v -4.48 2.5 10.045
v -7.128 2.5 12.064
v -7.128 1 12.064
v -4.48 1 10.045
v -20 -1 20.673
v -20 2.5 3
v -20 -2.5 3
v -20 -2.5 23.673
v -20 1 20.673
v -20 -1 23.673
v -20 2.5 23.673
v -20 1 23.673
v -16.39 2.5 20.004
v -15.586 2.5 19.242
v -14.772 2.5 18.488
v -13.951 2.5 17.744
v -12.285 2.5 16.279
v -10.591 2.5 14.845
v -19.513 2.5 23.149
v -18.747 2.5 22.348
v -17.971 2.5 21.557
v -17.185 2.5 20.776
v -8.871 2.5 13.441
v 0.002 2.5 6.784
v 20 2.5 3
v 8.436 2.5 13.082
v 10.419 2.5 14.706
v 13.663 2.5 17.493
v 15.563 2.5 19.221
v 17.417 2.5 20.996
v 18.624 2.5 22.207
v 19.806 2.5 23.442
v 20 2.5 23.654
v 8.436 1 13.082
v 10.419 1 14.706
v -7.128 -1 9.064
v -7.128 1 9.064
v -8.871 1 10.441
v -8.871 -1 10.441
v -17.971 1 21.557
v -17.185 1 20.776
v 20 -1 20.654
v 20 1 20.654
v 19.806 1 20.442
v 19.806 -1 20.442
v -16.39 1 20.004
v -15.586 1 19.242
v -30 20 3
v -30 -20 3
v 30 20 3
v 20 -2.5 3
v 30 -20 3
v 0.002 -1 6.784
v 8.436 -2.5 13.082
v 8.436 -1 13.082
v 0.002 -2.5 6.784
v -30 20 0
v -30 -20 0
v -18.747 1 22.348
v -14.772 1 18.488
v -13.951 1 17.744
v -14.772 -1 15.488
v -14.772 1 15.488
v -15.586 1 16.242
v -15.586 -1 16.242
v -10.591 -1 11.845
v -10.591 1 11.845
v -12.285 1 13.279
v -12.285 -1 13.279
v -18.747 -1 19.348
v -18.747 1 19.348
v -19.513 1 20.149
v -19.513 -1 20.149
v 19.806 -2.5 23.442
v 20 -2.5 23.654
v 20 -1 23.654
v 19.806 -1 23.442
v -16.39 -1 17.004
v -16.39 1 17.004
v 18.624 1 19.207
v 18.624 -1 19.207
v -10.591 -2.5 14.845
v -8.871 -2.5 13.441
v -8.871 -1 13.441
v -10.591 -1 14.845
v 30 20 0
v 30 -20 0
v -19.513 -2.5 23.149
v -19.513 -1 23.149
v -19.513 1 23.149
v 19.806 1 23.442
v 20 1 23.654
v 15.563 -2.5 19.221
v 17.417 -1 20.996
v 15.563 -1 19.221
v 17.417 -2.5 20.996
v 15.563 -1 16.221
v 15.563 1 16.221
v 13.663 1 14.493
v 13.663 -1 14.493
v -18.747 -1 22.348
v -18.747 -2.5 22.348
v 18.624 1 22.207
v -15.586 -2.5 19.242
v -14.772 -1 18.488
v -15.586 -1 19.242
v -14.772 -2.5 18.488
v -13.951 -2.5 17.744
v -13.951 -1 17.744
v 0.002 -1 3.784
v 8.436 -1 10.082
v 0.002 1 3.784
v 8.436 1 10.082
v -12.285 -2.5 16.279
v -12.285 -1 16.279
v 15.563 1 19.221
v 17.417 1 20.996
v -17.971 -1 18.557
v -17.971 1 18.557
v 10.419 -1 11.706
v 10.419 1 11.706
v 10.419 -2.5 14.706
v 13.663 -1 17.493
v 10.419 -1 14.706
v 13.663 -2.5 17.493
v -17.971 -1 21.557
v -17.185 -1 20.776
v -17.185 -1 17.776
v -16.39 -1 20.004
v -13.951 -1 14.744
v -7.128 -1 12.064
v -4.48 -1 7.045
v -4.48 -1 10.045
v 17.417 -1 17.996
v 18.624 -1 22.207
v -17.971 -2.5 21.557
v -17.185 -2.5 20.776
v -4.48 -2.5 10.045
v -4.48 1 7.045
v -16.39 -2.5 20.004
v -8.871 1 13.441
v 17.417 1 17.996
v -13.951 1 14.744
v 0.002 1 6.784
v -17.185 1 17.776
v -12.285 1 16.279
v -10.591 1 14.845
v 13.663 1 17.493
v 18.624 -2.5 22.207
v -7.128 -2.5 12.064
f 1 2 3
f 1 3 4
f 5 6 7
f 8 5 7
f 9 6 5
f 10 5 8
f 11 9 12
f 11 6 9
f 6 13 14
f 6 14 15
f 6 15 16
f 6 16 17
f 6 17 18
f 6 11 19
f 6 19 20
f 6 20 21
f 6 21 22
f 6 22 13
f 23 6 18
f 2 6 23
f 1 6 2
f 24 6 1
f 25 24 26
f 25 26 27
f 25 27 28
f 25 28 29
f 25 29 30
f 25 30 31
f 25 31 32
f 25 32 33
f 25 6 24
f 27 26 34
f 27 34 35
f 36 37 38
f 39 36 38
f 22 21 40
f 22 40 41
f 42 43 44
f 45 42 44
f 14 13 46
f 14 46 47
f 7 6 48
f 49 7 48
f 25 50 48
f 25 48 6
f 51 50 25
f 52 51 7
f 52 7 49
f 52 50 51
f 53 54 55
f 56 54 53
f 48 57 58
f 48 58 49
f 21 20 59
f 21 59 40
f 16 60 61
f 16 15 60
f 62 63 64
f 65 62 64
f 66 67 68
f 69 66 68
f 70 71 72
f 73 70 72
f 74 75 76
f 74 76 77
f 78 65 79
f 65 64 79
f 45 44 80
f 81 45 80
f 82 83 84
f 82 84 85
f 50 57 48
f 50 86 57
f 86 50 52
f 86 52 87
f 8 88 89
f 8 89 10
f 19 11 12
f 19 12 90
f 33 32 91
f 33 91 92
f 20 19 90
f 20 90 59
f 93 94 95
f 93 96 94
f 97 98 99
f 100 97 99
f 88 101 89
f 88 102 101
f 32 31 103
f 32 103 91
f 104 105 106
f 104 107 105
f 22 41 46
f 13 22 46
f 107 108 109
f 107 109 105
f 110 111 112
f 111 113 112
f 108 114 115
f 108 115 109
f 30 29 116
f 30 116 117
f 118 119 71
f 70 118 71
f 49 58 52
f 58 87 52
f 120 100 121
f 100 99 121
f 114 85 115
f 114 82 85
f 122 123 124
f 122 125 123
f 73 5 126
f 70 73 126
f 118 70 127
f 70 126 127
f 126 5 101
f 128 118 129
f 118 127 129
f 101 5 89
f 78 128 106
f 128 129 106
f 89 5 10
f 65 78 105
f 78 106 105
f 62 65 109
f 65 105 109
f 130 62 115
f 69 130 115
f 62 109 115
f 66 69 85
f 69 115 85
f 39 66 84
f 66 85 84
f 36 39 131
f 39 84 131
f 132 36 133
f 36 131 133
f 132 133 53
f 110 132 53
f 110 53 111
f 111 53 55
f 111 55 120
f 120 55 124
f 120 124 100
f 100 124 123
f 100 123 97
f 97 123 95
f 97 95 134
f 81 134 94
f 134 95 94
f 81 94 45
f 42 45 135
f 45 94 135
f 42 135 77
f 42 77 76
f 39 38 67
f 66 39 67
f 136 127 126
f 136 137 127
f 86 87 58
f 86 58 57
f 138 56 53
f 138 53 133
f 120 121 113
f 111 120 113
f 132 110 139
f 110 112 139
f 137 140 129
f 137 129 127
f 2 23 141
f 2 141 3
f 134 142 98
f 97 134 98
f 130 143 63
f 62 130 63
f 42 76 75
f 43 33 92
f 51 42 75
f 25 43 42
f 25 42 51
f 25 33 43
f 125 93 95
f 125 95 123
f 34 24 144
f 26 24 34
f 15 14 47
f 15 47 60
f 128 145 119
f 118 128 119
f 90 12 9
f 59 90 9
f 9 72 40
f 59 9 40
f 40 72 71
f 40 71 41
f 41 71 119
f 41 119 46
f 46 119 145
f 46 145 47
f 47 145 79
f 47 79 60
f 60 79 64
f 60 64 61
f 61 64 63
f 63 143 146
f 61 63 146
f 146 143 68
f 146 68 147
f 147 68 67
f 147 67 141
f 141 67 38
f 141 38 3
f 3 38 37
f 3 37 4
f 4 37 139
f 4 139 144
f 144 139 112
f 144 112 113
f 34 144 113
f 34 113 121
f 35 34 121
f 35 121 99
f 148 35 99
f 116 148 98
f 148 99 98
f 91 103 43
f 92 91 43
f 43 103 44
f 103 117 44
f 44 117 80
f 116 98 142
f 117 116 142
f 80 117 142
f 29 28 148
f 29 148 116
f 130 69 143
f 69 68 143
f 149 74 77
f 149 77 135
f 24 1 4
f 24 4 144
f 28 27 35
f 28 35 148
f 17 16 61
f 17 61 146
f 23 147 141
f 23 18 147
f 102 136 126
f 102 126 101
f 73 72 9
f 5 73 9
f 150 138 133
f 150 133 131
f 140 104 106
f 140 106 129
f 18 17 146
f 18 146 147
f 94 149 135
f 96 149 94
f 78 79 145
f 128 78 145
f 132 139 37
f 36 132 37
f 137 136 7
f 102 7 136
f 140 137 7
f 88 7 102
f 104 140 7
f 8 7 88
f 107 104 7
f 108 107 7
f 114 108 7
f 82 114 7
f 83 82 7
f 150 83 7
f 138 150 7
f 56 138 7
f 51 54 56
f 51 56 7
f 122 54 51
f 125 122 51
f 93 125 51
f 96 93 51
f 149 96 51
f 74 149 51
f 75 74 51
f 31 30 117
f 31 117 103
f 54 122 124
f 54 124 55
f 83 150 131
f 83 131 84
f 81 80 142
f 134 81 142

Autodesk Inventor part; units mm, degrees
ref_plane "YZ Plane" through (0, 0, 0) normal (1, 0, 0) x (0, 1, 0)
ref_plane "XZ Plane" through (0, 0, 0) normal (0, 1, 0) x (-1, 0, 0)
ref_plane "XY Plane" through (0, 0, 0) normal (0, 0, 1) x (1, 0, 0)
sketch "Sketch1" plane through (0, 0, 0) normal (0, 0, 1) x (1, 0, 0)
  line L0 (-20, -20) -> (20, -20)
  line L1 (20, -20) -> (20, 20)
  line L2 (20, 20) -> (-20, 20)
  line L3 (-20, 20) -> (-20, -20)
  line L4 (-20, -20) -> (20, 20) construction
  line L5 (20, -20) -> (-20, 20) construction
  point P0 (0, 0)
  dimension "d0" = 40
  dimension "d1" = 40
extrude "Extrusion1" add sketch "Sketch1" along normal blind 3
ref_plane "Work Plane1" through (-20, 0, 0) normal (0, -1, 0) x (1, 0, 0)
sketch "Sketch2" plane through (-20, 0, 0) normal (0, -1, 0) x (1, 0, 0)
  line L0 (0, 3) -> (40, 3)
  line L1 (0, 3) -> (40, 3) projected
  line L2 (2.7399, 64.6358) -> (3.1064, 64.6633)
  line L3 (3.1064, 64.6633) -> (5.3254, 64.7366)
  line L4 (5.3254, 64.7366) -> (6.8098, 64.6805)
  line L5 (6.8098, 64.6805) -> (7.9171, 64.5726)
  line L6 (7.9171, 64.5726) -> (9.0137, 64.4014)
  line L7 (9.0137, 64.4014) -> (9.7363, 64.2487)
  line L8 (9.7363, 64.2487) -> (10.4503, 64.0633)
  line L9 (10.4503, 64.0633) -> (11.1543, 63.8429)
  line L10 (11.1543, 63.8429) -> (11.8466, 63.5859)
  line L11 (11.8466, 63.5859) -> (12.5259, 63.2902)
  line L12 (12.5259, 63.2902) -> (13.1906, 62.9542)
  line L13 (13.1906, 62.9542) -> (13.4715, 62.803)
  line L14 (13.4715, 62.803) -> (14.2878, 62.3129)
  line L15 (14.2878, 62.3129) -> (15.32, 61.5828)
  line L16 (15.32, 61.5828) -> (16.5315, 60.5677)
  line L17 (16.5315, 60.5677) -> (20.0008, 56.8714)
  line L18 (20.0008, 56.8714) -> (23.8357, 60.8912)
  line L19 (23.8357, 60.8912) -> (25.2129, 61.9747)
  line L20 (25.2129, 61.9747) -> (26.196, 62.6151)
  line L21 (26.196, 62.6151) -> (26.5392, 62.8162)
  line L22 (26.5392, 62.8162) -> (26.8872, 63.0056)
  line L23 (26.8872, 63.0056) -> (27.2398, 63.1837)
  line L24 (27.2398, 63.1837) -> (27.5967, 63.3505)
  line L25 (27.5967, 63.3505) -> (27.9576, 63.5065)
  line L26 (27.9576, 63.5065) -> (28.6909, 63.787)
  line L27 (28.6909, 63.787) -> (29.4377, 64.0268)
  line L28 (29.4377, 64.0268) -> (30.1962, 64.2283)
  line L29 (30.1962, 64.2283) -> (30.9647, 64.3931)
  line L30 (30.9647, 64.3931) -> (31.7412, 64.5234)
  line L31 (31.7412, 64.5234) -> (32.5239, 64.6211)
  line L32 (32.5239, 64.6211) -> (33.7056, 64.711)
  line L33 (33.7056, 64.711) -> (35.2857, 64.7355)
  line L34 (35.2857, 64.7355) -> (37.2476, 64.6353)
  line L35 (37.2476, 64.6353) -> (37.63, 64.5998)
  line L36 (37.63, 64.5998) -> (38.0105, 64.5528)
  line L37 (38.0105, 64.5528) -> (38.3888, 64.4946)
  line L38 (38.3888, 64.4946) -> (39.1384, 64.3456)
  line L39 (39.1384, 64.3456) -> (39.8773, 64.1541)
  line L40 (39.8773, 64.1541) -> (40.6042, 63.922)
  line L41 (40.6042, 63.922) -> (41.3175, 63.6507)
  line L42 (41.3175, 63.6507) -> (42.016, 63.342)
  line L43 (42.016, 63.342) -> (42.6982, 62.9974)
  line L44 (42.6982, 62.9974) -> (43.3626, 62.6184)
  line L45 (43.3626, 62.6184) -> (44.0079, 62.2069)
  line L46 (44.0079, 62.2069) -> (44.6325, 61.7642)
  line L47 (44.6325, 61.7642) -> (45.2352, 61.2922)
  line L48 (45.2352, 61.2922) -> (45.8145, 60.7922)
  line L49 (45.8145, 60.7922) -> (46.3689, 60.2662)
  line L50 (46.3689, 60.2662) -> (46.8971, 59.7155)
  line L51 (46.8971, 59.7155) -> (47.2127, 59.3682)
  line L52 (47.2127, 59.3682) -> (47.5175, 59.0127)
  line L53 (47.5175, 59.0127) -> (47.8117, 58.6495)
  line L54 (47.8117, 58.6495) -> (48.0953, 58.2789)
  line L55 (48.0953, 58.2789) -> (48.3683, 57.901)
  line L56 (48.3683, 57.901) -> (48.631, 57.5163)
  line L57 (48.631, 57.5163) -> (48.8832, 57.1249)
  line L58 (48.8832, 57.1249) -> (49.1252, 56.7273)
  line L59 (49.1252, 56.7273) -> (49.3571, 56.3236)
  line L60 (49.3571, 56.3236) -> (49.5788, 55.9142)
  line L61 (49.5788, 55.9142) -> (49.7904, 55.4993)
  line L62 (49.7904, 55.4993) -> (50.1842, 54.6545)
  line L63 (50.1842, 54.6545) -> (50.5388, 53.7914)
  line L64 (50.5388, 53.7914) -> (50.8551, 52.9125)
  line L65 (50.8551, 52.9125) -> (51.1337, 52.02)
  line L66 (51.1337, 52.02) -> (51.3753, 51.1164)
  line L67 (51.3753, 51.1164) -> (51.5805, 50.2039)
  line L68 (51.5805, 50.2039) -> (51.75, 49.285)
  line L69 (51.75, 49.285) -> (51.8844, 48.3619)
  line L70 (51.8844, 48.3619) -> (51.9845, 47.437)
  line L71 (51.9845, 47.437) -> (51.9845, 43.3851)
  line L72 (51.9845, 43.3851) -> (51.9243, 42.8006)
  line L73 (51.9243, 42.8006) -> (51.8499, 42.2155)
  line L74 (51.8499, 42.2155) -> (51.7619, 41.6333)
  line L75 (51.7619, 41.6333) -> (51.6607, 41.054)
  line L76 (51.6607, 41.054) -> (51.5466, 40.4777)
  line L77 (51.5466, 40.4777) -> (51.4199, 39.9045)
  line L78 (51.4199, 39.9045) -> (51.2809, 39.3344)
  line L79 (51.2809, 39.3344) -> (51.13, 38.7676)
  line L80 (51.13, 38.7676) -> (50.9673, 38.204)
  line L81 (50.9673, 38.204) -> (50.7934, 37.6437)
  line L82 (50.7934, 37.6437) -> (50.6084, 37.0868)
  line L83 (50.6084, 37.0868) -> (50.2065, 35.9835)
  line L84 (50.2065, 35.9835) -> (49.7643, 34.8947)
  line L85 (49.7643, 34.8947) -> (49.2842, 33.8209)
  line L86 (49.2842, 33.8209) -> (48.7687, 32.7625)
  line L87 (48.7687, 32.7625) -> (48.2203, 31.7202)
  line L88 (48.2203, 31.7202) -> (47.6416, 30.6945)
  line L89 (47.6416, 30.6945) -> (46.7221, 29.1882)
  line L90 (46.7221, 29.1882) -> (45.7483, 27.7223)
  line L91 (45.7483, 27.7223) -> (45.2527, 27.0233)
  line L92 (45.2527, 27.0233) -> (44.7473, 26.3323)
  line L93 (44.7473, 26.3323) -> (44.2325, 25.649)
  line L94 (44.2325, 25.649) -> (43.7084, 24.9733)
  line L95 (43.7084, 24.9733) -> (43.1754, 24.305)
  line L96 (43.1754, 24.305) -> (42.0839, 22.9901)
  line L97 (42.0839, 22.9901) -> (40.96, 21.703)
  line L98 (40.96, 21.703) -> (39.806, 20.4424)
  line L99 (39.806, 20.4424) -> (38.6242, 19.2071)
  line L100 (38.6242, 19.2071) -> (37.4168, 17.9958)
  line L101 (37.4168, 17.9958) -> (35.5626, 16.2211)
  line L102 (35.5626, 16.2211) -> (33.6634, 14.4931)
  line L103 (33.6634, 14.4931) -> (30.4186, 11.7057)
  line L104 (30.4186, 11.7057) -> (28.4362, 10.0816)
  line L105 (28.4362, 10.0816) -> (20.0016, 3.7839)
  line L106 (20.0016, 3.7839) -> (15.5199, 7.0446)
  line L107 (15.5199, 7.0446) -> (12.8715, 9.064)
  line L108 (12.8715, 9.064) -> (11.1293, 10.4411)
  line L109 (11.1293, 10.4411) -> (9.4094, 11.8452)
  line L110 (9.4094, 11.8452) -> (7.7149, 13.2787)
  line L111 (7.7149, 13.2787) -> (6.0489, 14.7435)
  line L112 (6.0489, 14.7435) -> (5.2275, 15.4884)
  line L113 (5.2275, 15.4884) -> (4.4145, 16.242)
  line L114 (4.4145, 16.242) -> (3.6101, 17.0045)
  line L115 (3.6101, 17.0045) -> (2.8148, 17.7762)
  line L116 (2.8148, 17.7762) -> (2.0289, 18.5574)
  line L117 (2.0289, 18.5574) -> (1.2528, 19.3484)
  line L118 (1.2528, 19.3484) -> (0.487, 20.1494)
  line L119 (0.487, 20.1494) -> (-0.2682, 20.9606)
  line L120 (-0.2682, 20.9606) -> (-1.0124, 21.7824)
  line L121 (-1.0124, 21.7824) -> (-1.7452, 22.6151)
  line L122 (-1.7452, 22.6151) -> (-2.4663, 23.4588)
  line L123 (-2.4663, 23.4588) -> (-3.1752, 24.3139)
  line L124 (-3.1752, 24.3139) -> (-3.8715, 25.1807)
  line L125 (-3.8715, 25.1807) -> (-4.7177, 26.2914)
  line L126 (-4.7177, 26.2914) -> (-5.5375, 27.4273)
  line L127 (-5.5375, 27.4273) -> (-6.3273, 28.5876)
  line L128 (-6.3273, 28.5876) -> (-7.0831, 29.7717)
  line L129 (-7.0831, 29.7717) -> (-7.4472, 30.3726)
  line L130 (-7.4472, 30.3726) -> (-7.8013, 30.9792)
  line L131 (-7.8013, 30.9792) -> (-8.1451, 31.5915)
  line L132 (-8.1451, 31.5915) -> (-8.4779, 32.2094)
  line L133 (-8.4779, 32.2094) -> (-8.7995, 32.8328)
  line L134 (-8.7995, 32.8328) -> (-9.1093, 33.4617)
  line L135 (-9.1093, 33.4617) -> (-9.4067, 34.096)
  line L136 (-9.4067, 34.096) -> (-9.6915, 34.7356)
  line L137 (-9.6915, 34.7356) -> (-9.9629, 35.3804)
  line L138 (-9.9629, 35.3804) -> (-10.2207, 36.0305)
  line L139 (-10.2207, 36.0305) -> (-10.4643, 36.6856)
  line L140 (-10.4643, 36.6856) -> (-10.6932, 37.3458)
  line L141 (-10.6932, 37.3458) -> (-10.907, 38.0109)
  line L142 (-10.907, 38.0109) -> (-11.1052, 38.6809)
  line L143 (-11.1052, 38.6809) -> (-11.2872, 39.3557)
  line L144 (-11.2872, 39.3557) -> (-11.4527, 40.0352)
  line L145 (-11.4527, 40.0352) -> (-11.6012, 40.7195)
  line L146 (-11.6012, 40.7195) -> (-11.7322, 41.4083)
  line L147 (-11.7322, 41.4083) -> (-11.8451, 42.1017)
  line L148 (-11.8451, 42.1017) -> (-11.9396, 42.7995)
  line L149 (-11.9396, 42.7995) -> (-12.0151, 43.5017)
  line L150 (-12.0151, 43.5017) -> (-12.0151, 47.195)
  line L151 (-12.0151, 47.195) -> (-11.8821, 48.423)
  line L152 (-11.8821, 48.423) -> (-11.6913, 49.646)
  line L153 (-11.6913, 49.646) -> (-11.4406, 50.8589)
  line L154 (-11.4406, 50.8589) -> (-11.1277, 52.0567)
  line L155 (-11.1277, 52.0567) -> (-10.7505, 53.2347)
  line L156 (-10.7505, 53.2347) -> (-10.4622, 54.0065)
  line L157 (-10.4622, 54.0065) -> (-10.1438, 54.7658)
  line L158 (-10.1438, 54.7658) -> (-9.7945, 55.511)
  line L159 (-9.7945, 55.511) -> (-9.4137, 56.2409)
  line L160 (-9.4137, 56.2409) -> (-9.0008, 56.9538)
  line L161 (-9.0008, 56.9538) -> (-8.5551, 57.6483)
  line L162 (-8.5551, 57.6483) -> (-8.076, 58.323)
  line L163 (-8.076, 58.323) -> (-7.807, 58.6753)
  line L164 (-7.807, 58.6753) -> (-7.5285, 59.0209)
  line L165 (-7.5285, 59.0209) -> (-7.2406, 59.3595)
  line L166 (-7.2406, 59.3595) -> (-6.9435, 59.6908)
  line L167 (-6.9435, 59.6908) -> (-6.6375, 60.0145)
  line L168 (-6.6375, 60.0145) -> (-6.3229, 60.3303)
  line L169 (-6.3229, 60.3303) -> (-5.9999, 60.6377)
  line L170 (-5.9999, 60.6377) -> (-5.6688, 60.9366)
  line L171 (-5.6688, 60.9366) -> (-5.3297, 61.2265)
  line L172 (-5.3297, 61.2265) -> (-4.9829, 61.5071)
  line L173 (-4.9829, 61.5071) -> (-4.6287, 61.7781)
  line L174 (-4.6287, 61.7781) -> (-4.2674, 62.0391)
  line L175 (-4.2674, 62.0391) -> (-3.8989, 62.2899)
  line L176 (-3.8989, 62.2899) -> (-3.5239, 62.5301)
  line L177 (-3.5239, 62.5301) -> (-3.1425, 62.7594)
  line L178 (-3.1425, 62.7594) -> (-2.7548, 62.9773)
  line L179 (-2.7548, 62.9773) -> (-2.3611, 63.1837)
  line L180 (-2.3611, 63.1837) -> (-1.9617, 63.3782)
  line L181 (-1.9617, 63.3782) -> (-1.5569, 63.5603)
  line L182 (-1.5569, 63.5603) -> (-1.1468, 63.73)
  line L183 (-1.1468, 63.73) -> (-0.7316, 63.8867)
  line L184 (-0.7316, 63.8867) -> (-0.3117, 64.0302)
  line L185 (-0.3117, 64.0302) -> (0.1126, 64.16)
  line L186 (0.1126, 64.16) -> (0.5413, 64.276)
  line L187 (0.5413, 64.276) -> (0.9739, 64.3778)
  line L188 (0.9739, 64.3778) -> (1.4104, 64.465)
  line L189 (1.4104, 64.465) -> (1.8503, 64.5372)
  line L190 (1.8503, 64.5372) -> (2.2936, 64.5943)
  line L191 (2.2936, 64.5943) -> (2.7399, 64.6358)
  line L192 (0, 3) -> (0, 20.6726)
  line L193 (40, 0) -> (40, 3) projected
  line L194 (40, 3) -> (40, 20.6543)
  point P0 (20, 0)
  dimension "d0" = 40
extrude "Extrusion2" add sketch "Sketch2" along normal mid plane 5 contours L192 L119 L118 L117 L116 L115 L114 L113 L112 L111 L110 L109 L108 L107 L106 L105 L104 L103 L102 L101 L100 L99 L98 L194 L0
sketch "Sketch3" plane through (0, 0, 3) normal (0, 0, 1) x (1, 0, 0)
  point P0 (0, 0)
sketch "Sketch4" plane through (-20, -2.5, 0) normal (0, -1, 0) x (1, 0, 0)
  line L0 (0.487, 20.1494) -> (0, 20.6726) projected
  line L1 (1.2528, 19.3484) -> (0.487, 20.1494) projected
  line L2 (2.0289, 18.5574) -> (1.2528, 19.3484) projected
  line L3 (2.8148, 17.7762) -> (2.0289, 18.5574) projected
  line L4 (3.6101, 17.0045) -> (2.8148, 17.7762) projected
  line L5 (4.4145, 16.242) -> (3.6101, 17.0045) projected
  line L6 (5.2275, 15.4884) -> (4.4145, 16.242) projected
  line L7 (6.0489, 14.7435) -> (5.2275, 15.4884) projected
  line L8 (7.7149, 13.2787) -> (6.0489, 14.7435) projected
  line L9 (9.4094, 11.8452) -> (7.7149, 13.2787) projected
  line L10 (11.1293, 10.4411) -> (9.4094, 11.8452) projected
  line L11 (12.8715, 9.064) -> (11.1293, 10.4411) projected
  line L12 (15.5199, 7.0446) -> (12.8715, 9.064) projected
  line L13 (40, 3) -> (0, 3) projected
  line L14 (40, 3) -> (40, 20.6543) projected
  line L15 (40, 20.6543) -> (39.806, 20.4424) projected
  line L16 (39.806, 20.4424) -> (38.6242, 19.2071) projected
  line L17 (38.6242, 19.2071) -> (37.4168, 17.9958) projected
  line L18 (37.4168, 17.9958) -> (35.5626, 16.2211) projected
  line L19 (35.5626, 16.2211) -> (33.6634, 14.4931) projected
  line L20 (33.6634, 14.4931) -> (30.4186, 11.7057) projected
  line L21 (30.4186, 11.7057) -> (28.4362, 10.0816) projected
  line L22 (28.4362, 10.0816) -> (20.0016, 3.7839) projected
  line L23 (20.0016, 3.7839) -> (15.5199, 7.0446) projected
  line L24 (15.5199, 7.0446) -> (12.8715, 9.064) projected
  line L25 (12.8715, 9.064) -> (11.1293, 10.4411) projected
  line L26 (11.1293, 10.4411) -> (9.4094, 11.8452) projected
  line L27 (9.4094, 11.8452) -> (7.7149, 13.2787) projected
  line L28 (7.7149, 13.2787) -> (6.0489, 14.7435) projected
  line L29 (6.0489, 14.7435) -> (5.2275, 15.4884) projected
  line L30 (5.2275, 15.4884) -> (4.4145, 16.242) projected
  line L31 (4.4145, 16.242) -> (3.6101, 17.0045) projected
  line L32 (3.6101, 17.0045) -> (2.8148, 17.7762) projected
  line L33 (2.8148, 17.7762) -> (2.0289, 18.5574) projected
  line L34 (2.0289, 18.5574) -> (1.2528, 19.3484) projected
  line L35 (1.2528, 19.3484) -> (0.487, 20.1494) projected
  line L36 (0.487, 20.1494) -> (0, 20.6726) projected
  line L37 (0, 20.6726) -> (0, 3) projected
  line L38 (28.4362, 10.0816) -> (20.0016, 3.7839) projected
  line L39 (20.0016, 3.7839) -> (40.0016, 3.7839) construction
  line L40 (0.487, 23.1494) -> (0, 23.6726)
  line L41 (1.2528, 22.3484) -> (0.487, 23.1494)
  line L42 (2.0289, 21.5574) -> (1.2528, 22.3484)
  line L43 (2.8148, 20.7762) -> (2.0289, 21.5574)
  line L44 (3.6101, 20.0045) -> (2.8148, 20.7762)
  line L45 (4.4145, 19.242) -> (3.6101, 20.0045)
  line L46 (5.2275, 18.4884) -> (4.4145, 19.242)
  line L47 (6.0489, 17.7435) -> (5.2275, 18.4884)
  line L48 (7.7149, 16.2787) -> (6.0489, 17.7435)
  line L49 (9.4094, 14.8452) -> (7.7149, 16.2787)
  line L50 (11.1293, 13.4411) -> (9.4094, 14.8452)
  line L51 (12.8715, 12.064) -> (11.1293, 13.4411)
  line L52 (15.5199, 10.0446) -> (12.8715, 12.064)
  line L53 (40, 23.6543) -> (39.806, 23.4424)
  line L54 (39.806, 23.4424) -> (38.6242, 22.2071)
  line L55 (38.6242, 22.2071) -> (37.4168, 20.9958)
  line L56 (37.4168, 20.9958) -> (35.5626, 19.2211)
  line L57 (35.5626, 19.2211) -> (33.6634, 17.4931)
  line L58 (33.6634, 17.4931) -> (30.4186, 14.7057)
  line L59 (30.4186, 14.7057) -> (28.4362, 13.0816)
  line L60 (28.4362, 13.0816) -> (20.0016, 6.7839)
  line L61 (20.0016, 6.7839) -> (15.5199, 10.0446)
  line L62 (15.5199, 10.0446) -> (12.8715, 12.064)
  line L63 (12.8715, 12.064) -> (11.1293, 13.4411)
  line L64 (11.1293, 13.4411) -> (9.4094, 14.8452)
  line L65 (9.4094, 14.8452) -> (7.7149, 16.2787)
  line L66 (7.7149, 16.2787) -> (6.0489, 17.7435)
  line L67 (6.0489, 17.7435) -> (5.2275, 18.4884)
  line L68 (5.2275, 18.4884) -> (4.4145, 19.242)
  line L69 (4.4145, 19.242) -> (3.6101, 20.0045)
  line L70 (3.6101, 20.0045) -> (2.8148, 20.7762)
  line L71 (2.8148, 20.7762) -> (2.0289, 21.5574)
  line L72 (2.0289, 21.5574) -> (1.2528, 22.3484)
  line L73 (1.2528, 22.3484) -> (0.487, 23.1494)
  line L74 (0.487, 23.1494) -> (0, 23.6726)
  line L75 (28.4362, 13.0816) -> (20.0016, 6.7839)
  line L76 (20.0016, 6.7839) -> (40.0016, 6.7839) construction
  line L77 (20.0016, 3.7839) -> (20.0016, 6.7839)
  line L78 (0, 23.6726) -> (0, 20.6726)
  line L79 (40, 23.6543) -> (40, 20.6543)
  point P0 (20, 0)
  dimension "d15" = 3
extrude "Extrusion3" add sketch "Sketch4" against normal blind 1.5 contours L0 L78 L40 L41 L42 L43 L44 L45 L46 L47 L48 L49 L50 L51 L52 L61 L77 L23 L12 L11 L10 L9 L8 L7 L6 L5 L4 L3 L2 L1 | L15 L16 L17 L18 L19 L20 L21 L22 L77 L60 L59 L58 L57 L56 L55 L54 L53 L79
sketch "Sketch5" plane through (-20, 2.5, 0) normal (0, 1, 0) x (1, 0, 0)
  line L0 (40, -23.6543) -> (40, -20.6543) projected
  line L1 (39.806, -20.4424) -> (40, -20.6543) projected
  line L2 (38.6242, -19.2071) -> (39.806, -20.4424) projected
  line L3 (37.4168, -17.9958) -> (38.6242, -19.2071) projected
  line L4 (35.5626, -16.2211) -> (37.4168, -17.9958) projected
  line L5 (33.6634, -14.4931) -> (35.5626, -16.2211) projected
  line L6 (30.4186, -11.7057) -> (33.6634, -14.4931) projected
  line L7 (28.4362, -10.0816) -> (30.4186, -11.7057) projected
  line L8 (20.0016, -3.7839) -> (28.4362, -10.0816) projected
  line L9 (15.5199, -7.0446) -> (20.0016, -3.7839) projected
  line L10 (12.8715, -9.064) -> (15.5199, -7.0446) projected
  line L11 (11.1293, -10.4411) -> (12.8715, -9.064) projected
  line L12 (9.4094, -11.8452) -> (11.1293, -10.4411) projected
  line L13 (7.7149, -13.2787) -> (9.4094, -11.8452) projected
  line L14 (6.0489, -14.7435) -> (7.7149, -13.2787) projected
  line L15 (5.2275, -15.4884) -> (6.0489, -14.7435) projected
  line L16 (4.4145, -16.242) -> (5.2275, -15.4884) projected
  line L17 (3.6101, -17.0045) -> (4.4145, -16.242) projected
  line L18 (2.8148, -17.7762) -> (3.6101, -17.0045) projected
  line L19 (2.0289, -18.5574) -> (2.8148, -17.7762) projected
  line L20 (1.2528, -19.3484) -> (2.0289, -18.5574) projected
  line L21 (0.487, -20.1494) -> (1.2528, -19.3484) projected
  line L22 (0, -20.6726) -> (0.487, -20.1494) projected
  line L23 (0, -20.6726) -> (0, -23.6726) projected
  line L24 (0, -23.6726) -> (0.487, -23.1494) projected
  line L25 (0.487, -23.1494) -> (1.2528, -22.3484) projected
  line L26 (1.2528, -22.3484) -> (2.0289, -21.5574) projected
  line L27 (2.0289, -21.5574) -> (2.8148, -20.7762) projected
  line L28 (2.8148, -20.7762) -> (3.6101, -20.0045) projected
  line L29 (3.6101, -20.0045) -> (4.4145, -19.242) projected
  line L30 (4.4145, -19.242) -> (5.2275, -18.4884) projected
  line L31 (5.2275, -18.4884) -> (6.0489, -17.7435) projected
  line L32 (6.0489, -17.7435) -> (7.7149, -16.2787) projected
  line L33 (7.7149, -16.2787) -> (9.4094, -14.8452) projected
  line L34 (9.4094, -14.8452) -> (11.1293, -13.4411) projected
  line L35 (11.1293, -13.4411) -> (12.8715, -12.064) projected
  line L36 (12.8715, -12.064) -> (15.5199, -10.0446) projected
  line L37 (15.5199, -10.0446) -> (20.0016, -6.7839) projected
  line L38 (20.0016, -6.7839) -> (28.4362, -13.0816) projected
  line L39 (28.4362, -13.0816) -> (30.4186, -14.7057) projected
  line L40 (30.4186, -14.7057) -> (33.6634, -17.4931) projected
  line L41 (33.6634, -17.4931) -> (35.5626, -19.2211) projected
  line L42 (35.5626, -19.2211) -> (37.4168, -20.9958) projected
  line L43 (37.4168, -20.9958) -> (38.6242, -22.2071) projected
  line L44 (38.6242, -22.2071) -> (39.806, -23.4424) projected
  line L45 (39.806, -23.4424) -> (40, -23.6543) projected
  point P0 (20, 0)
extrude "Extrusion4" add sketch "Sketch5" against normal blind 1.5
sketch "Sketch6" plane through (20, -20, 0) normal (1, 0, 0) x (0, 0, -1)
  line L0 (-3, 17.5) -> (-3, 0) projected
  line L1 (-3, 0) -> (-3, 40)
  line L2 (0, 40) -> (-3, 40) projected
  line L3 (-3, 40) -> (0, 40)
  line L4 (0, 40) -> (0, 0)
  line L5 (0, 0) -> (-3, 0)
  point P0 (0, 20)
extrude "Extrusion5" add sketch "Sketch6" along normal blind 10
sketch "Sketch7" plane through (-20, -20, 0) normal (-1, 0, 0) x (0, 0, 1)
  line L0 (0, 40) -> (3, 40) projected
  line L1 (3, 17.5) -> (3, 0) projected
  line L2 (3, 40) -> (3, 0)
  line L3 (0, 0) -> (3, 0) projected
  line L4 (3, 0) -> (0, 0)
  line L5 (0, 0) -> (0, 40)
  line L6 (0, 40) -> (3, 40)
  point P0 (0, 20)
extrude "Extrusion6" add sketch "Sketch7" along normal blind 10
properties part number "Supporto2"
